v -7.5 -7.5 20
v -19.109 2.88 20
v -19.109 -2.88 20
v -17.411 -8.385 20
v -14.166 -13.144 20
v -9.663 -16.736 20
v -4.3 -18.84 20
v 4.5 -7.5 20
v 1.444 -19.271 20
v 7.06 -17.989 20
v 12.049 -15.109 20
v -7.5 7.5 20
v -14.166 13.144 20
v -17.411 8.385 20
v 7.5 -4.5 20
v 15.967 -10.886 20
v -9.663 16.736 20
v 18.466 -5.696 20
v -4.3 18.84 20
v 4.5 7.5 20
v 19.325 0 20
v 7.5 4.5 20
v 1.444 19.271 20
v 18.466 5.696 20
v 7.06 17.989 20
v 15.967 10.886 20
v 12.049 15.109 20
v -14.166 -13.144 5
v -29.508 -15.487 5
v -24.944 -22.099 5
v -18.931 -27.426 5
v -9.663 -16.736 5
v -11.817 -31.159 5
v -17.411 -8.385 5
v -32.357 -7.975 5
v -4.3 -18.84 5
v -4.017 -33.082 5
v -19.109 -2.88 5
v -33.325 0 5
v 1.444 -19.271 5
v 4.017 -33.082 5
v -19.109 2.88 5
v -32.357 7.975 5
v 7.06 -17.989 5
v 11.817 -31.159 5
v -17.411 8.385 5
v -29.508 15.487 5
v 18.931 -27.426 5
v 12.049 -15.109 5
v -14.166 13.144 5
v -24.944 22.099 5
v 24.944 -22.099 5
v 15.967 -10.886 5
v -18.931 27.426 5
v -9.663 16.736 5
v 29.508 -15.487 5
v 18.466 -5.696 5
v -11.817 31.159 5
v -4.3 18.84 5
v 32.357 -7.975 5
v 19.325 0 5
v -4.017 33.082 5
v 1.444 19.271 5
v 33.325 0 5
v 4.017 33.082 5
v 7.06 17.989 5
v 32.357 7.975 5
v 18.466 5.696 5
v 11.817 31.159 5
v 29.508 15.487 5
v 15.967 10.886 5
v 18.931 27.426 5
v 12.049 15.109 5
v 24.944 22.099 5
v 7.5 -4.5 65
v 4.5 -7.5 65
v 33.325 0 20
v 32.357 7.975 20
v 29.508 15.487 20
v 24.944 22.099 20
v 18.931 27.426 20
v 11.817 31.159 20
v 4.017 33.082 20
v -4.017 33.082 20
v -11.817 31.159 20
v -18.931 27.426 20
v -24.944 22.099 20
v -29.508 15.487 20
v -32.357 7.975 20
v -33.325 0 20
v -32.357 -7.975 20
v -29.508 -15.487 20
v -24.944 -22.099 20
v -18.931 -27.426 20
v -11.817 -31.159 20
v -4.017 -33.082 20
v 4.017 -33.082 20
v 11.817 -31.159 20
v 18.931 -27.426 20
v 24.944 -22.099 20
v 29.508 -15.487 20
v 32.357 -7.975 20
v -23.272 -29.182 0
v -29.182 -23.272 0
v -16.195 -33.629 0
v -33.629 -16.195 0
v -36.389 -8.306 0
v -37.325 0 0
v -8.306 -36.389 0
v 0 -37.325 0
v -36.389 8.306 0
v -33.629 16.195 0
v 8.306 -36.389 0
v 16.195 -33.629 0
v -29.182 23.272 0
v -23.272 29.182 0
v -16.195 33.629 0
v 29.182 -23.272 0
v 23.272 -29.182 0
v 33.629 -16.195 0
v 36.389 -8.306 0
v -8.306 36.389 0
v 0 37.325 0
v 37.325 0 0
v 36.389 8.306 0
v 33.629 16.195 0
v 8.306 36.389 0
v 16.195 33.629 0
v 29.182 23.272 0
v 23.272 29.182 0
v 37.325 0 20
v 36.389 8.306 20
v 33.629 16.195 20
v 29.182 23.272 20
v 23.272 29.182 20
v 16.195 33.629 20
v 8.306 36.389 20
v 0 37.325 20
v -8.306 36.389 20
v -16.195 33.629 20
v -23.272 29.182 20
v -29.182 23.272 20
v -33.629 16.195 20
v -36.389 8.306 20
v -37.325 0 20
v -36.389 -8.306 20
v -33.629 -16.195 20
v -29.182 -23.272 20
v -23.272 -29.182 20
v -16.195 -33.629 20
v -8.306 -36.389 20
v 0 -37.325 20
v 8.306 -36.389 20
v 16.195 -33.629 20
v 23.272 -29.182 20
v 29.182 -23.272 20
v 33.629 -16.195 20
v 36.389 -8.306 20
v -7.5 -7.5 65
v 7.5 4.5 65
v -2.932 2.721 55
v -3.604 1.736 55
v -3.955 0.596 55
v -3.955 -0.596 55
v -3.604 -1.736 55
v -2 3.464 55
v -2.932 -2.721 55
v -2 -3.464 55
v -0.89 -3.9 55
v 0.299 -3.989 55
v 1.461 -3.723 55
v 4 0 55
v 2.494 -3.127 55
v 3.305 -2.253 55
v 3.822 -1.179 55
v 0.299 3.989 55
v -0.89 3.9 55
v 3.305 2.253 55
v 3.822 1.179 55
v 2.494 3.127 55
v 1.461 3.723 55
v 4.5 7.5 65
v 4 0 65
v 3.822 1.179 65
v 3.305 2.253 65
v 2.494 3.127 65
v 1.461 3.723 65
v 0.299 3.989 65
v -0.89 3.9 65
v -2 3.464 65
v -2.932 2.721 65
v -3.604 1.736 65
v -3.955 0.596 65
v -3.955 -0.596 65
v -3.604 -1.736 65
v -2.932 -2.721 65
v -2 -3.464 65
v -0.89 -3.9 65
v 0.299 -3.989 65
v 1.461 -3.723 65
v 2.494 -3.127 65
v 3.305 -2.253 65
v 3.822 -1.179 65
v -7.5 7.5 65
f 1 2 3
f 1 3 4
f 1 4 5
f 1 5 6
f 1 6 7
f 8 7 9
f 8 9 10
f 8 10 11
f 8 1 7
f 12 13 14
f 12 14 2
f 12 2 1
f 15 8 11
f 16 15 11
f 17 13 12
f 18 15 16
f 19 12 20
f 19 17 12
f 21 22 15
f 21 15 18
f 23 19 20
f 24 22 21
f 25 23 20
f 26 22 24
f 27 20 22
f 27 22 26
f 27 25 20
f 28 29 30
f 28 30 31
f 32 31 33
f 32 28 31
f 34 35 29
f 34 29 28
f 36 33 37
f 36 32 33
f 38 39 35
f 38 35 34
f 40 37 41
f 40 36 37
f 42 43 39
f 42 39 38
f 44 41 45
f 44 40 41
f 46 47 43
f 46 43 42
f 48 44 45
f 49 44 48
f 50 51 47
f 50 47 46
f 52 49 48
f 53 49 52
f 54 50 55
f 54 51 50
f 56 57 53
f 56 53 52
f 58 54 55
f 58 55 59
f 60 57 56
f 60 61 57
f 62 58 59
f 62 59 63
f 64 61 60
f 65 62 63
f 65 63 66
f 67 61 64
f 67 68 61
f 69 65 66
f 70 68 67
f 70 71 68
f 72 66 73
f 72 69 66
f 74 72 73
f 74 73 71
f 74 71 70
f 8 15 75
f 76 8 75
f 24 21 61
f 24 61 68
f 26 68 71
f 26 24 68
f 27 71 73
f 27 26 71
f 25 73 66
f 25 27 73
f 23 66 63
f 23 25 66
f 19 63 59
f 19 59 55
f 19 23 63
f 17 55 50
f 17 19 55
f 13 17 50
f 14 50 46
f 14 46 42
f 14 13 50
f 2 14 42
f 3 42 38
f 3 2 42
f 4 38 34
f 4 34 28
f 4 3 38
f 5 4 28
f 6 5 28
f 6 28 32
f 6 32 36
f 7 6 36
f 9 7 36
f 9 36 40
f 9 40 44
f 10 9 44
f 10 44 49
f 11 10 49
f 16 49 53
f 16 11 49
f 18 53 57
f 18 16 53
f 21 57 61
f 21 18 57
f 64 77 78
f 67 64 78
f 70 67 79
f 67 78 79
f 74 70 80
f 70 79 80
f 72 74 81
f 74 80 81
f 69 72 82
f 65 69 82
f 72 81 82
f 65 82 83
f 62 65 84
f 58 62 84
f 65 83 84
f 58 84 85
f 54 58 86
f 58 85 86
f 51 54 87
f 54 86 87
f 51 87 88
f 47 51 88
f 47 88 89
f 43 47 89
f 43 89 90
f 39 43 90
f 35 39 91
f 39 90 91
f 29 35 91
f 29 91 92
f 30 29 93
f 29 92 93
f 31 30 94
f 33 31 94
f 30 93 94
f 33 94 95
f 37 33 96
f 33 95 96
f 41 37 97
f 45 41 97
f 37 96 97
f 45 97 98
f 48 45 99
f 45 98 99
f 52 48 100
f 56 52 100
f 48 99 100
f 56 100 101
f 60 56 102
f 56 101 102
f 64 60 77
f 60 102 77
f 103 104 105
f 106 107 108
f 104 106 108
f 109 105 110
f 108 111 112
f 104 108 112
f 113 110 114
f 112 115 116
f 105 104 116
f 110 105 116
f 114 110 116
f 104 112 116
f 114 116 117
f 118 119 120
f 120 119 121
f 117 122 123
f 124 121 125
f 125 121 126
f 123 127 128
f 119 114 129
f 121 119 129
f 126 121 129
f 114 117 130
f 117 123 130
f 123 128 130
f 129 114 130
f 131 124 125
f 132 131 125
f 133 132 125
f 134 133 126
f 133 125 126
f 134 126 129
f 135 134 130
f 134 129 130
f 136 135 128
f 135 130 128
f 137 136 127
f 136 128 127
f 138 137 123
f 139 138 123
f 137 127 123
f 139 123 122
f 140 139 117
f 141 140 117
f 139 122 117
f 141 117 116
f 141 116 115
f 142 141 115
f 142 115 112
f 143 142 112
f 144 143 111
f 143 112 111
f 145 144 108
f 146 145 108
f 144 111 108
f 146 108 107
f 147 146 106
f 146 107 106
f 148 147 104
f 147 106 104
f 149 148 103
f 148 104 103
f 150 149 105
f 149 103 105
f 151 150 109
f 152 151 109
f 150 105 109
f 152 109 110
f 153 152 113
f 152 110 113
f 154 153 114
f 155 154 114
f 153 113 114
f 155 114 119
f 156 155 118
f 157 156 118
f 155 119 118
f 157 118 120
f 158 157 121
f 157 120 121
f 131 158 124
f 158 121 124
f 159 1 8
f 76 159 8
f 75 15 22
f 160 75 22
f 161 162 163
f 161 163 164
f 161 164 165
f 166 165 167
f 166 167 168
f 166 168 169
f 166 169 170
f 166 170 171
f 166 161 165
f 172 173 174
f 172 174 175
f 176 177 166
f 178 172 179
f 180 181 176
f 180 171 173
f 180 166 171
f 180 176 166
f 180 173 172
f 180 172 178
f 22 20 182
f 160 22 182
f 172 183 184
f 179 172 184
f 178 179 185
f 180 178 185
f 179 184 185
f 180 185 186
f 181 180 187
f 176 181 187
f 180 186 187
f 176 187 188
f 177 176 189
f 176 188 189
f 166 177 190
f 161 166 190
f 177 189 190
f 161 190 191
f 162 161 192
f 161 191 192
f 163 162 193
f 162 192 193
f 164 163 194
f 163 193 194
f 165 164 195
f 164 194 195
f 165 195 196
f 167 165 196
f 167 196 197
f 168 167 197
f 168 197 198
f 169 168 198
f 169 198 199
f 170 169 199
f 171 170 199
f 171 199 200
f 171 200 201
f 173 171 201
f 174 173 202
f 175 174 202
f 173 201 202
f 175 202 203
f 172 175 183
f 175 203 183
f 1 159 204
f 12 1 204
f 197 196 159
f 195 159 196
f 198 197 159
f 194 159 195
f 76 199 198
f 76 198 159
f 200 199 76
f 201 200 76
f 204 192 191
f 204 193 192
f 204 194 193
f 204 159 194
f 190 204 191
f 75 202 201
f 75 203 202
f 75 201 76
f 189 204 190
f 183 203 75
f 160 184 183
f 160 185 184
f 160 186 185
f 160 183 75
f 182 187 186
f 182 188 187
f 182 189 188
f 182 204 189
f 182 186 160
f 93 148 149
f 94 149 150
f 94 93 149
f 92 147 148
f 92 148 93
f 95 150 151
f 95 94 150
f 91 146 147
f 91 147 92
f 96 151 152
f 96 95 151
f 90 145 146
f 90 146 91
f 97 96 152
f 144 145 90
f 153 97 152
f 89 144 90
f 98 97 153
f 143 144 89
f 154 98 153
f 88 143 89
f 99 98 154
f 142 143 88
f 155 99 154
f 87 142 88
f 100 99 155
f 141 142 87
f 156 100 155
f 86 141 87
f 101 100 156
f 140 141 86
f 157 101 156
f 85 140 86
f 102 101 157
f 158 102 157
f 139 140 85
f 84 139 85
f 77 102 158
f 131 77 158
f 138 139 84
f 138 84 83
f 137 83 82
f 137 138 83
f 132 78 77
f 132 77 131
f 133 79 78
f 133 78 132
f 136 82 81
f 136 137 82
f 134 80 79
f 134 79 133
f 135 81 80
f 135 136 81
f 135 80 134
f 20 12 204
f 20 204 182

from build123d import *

# Parameters (mm, degrees)
F0_R     = 37.325
F1_DEPTH = 20
F2_R     = 33.325
F2_R_2   = 19.325
F3_DEPTH = 15
F4_W     = 15
F4_H     = 15
F5_DEPTH = 45
F6_SIZE2 = 3
F6_SIZE  = 3
F7_R     = 4
F8_DEPTH = 10


with BuildPart() as f1:
    # F0 (on Top) → F1 (new body)
    with BuildSketch(Plane.XY):
        Circle(F0_R)
    extrude(amount=F1_DEPTH)

    # F2 (on face) → F3 (cut)
    with BuildSketch(Plane.XY.offset(20)):
        Circle(F2_R)
        Circle(F2_R_2, mode=Mode.SUBTRACT)
    extrude(amount=-F3_DEPTH, mode=Mode.SUBTRACT)

    # F4 (on face) → F5 (join)
    with BuildSketch(Plane.XY.offset(20)):
        Rectangle(F4_W, F4_H)
    extrude(amount=F5_DEPTH)

    # F6
    f6_edges = [f1.edges().sort_by_distance(p)[0] for p in [
        (7.5, 7.5, 42.5),
        (7.5, -7.5, 42.5),
    ]]
    chamfer(f6_edges, length=F6_SIZE, length2=F6_SIZE2)

    # F7 (on face) → F8 (cut)
    with BuildSketch(Plane.XY.offset(65)):
        Circle(F7_R)
    extrude(amount=-F8_DEPTH, mode=Mode.SUBTRACT)


solid = f1.part
